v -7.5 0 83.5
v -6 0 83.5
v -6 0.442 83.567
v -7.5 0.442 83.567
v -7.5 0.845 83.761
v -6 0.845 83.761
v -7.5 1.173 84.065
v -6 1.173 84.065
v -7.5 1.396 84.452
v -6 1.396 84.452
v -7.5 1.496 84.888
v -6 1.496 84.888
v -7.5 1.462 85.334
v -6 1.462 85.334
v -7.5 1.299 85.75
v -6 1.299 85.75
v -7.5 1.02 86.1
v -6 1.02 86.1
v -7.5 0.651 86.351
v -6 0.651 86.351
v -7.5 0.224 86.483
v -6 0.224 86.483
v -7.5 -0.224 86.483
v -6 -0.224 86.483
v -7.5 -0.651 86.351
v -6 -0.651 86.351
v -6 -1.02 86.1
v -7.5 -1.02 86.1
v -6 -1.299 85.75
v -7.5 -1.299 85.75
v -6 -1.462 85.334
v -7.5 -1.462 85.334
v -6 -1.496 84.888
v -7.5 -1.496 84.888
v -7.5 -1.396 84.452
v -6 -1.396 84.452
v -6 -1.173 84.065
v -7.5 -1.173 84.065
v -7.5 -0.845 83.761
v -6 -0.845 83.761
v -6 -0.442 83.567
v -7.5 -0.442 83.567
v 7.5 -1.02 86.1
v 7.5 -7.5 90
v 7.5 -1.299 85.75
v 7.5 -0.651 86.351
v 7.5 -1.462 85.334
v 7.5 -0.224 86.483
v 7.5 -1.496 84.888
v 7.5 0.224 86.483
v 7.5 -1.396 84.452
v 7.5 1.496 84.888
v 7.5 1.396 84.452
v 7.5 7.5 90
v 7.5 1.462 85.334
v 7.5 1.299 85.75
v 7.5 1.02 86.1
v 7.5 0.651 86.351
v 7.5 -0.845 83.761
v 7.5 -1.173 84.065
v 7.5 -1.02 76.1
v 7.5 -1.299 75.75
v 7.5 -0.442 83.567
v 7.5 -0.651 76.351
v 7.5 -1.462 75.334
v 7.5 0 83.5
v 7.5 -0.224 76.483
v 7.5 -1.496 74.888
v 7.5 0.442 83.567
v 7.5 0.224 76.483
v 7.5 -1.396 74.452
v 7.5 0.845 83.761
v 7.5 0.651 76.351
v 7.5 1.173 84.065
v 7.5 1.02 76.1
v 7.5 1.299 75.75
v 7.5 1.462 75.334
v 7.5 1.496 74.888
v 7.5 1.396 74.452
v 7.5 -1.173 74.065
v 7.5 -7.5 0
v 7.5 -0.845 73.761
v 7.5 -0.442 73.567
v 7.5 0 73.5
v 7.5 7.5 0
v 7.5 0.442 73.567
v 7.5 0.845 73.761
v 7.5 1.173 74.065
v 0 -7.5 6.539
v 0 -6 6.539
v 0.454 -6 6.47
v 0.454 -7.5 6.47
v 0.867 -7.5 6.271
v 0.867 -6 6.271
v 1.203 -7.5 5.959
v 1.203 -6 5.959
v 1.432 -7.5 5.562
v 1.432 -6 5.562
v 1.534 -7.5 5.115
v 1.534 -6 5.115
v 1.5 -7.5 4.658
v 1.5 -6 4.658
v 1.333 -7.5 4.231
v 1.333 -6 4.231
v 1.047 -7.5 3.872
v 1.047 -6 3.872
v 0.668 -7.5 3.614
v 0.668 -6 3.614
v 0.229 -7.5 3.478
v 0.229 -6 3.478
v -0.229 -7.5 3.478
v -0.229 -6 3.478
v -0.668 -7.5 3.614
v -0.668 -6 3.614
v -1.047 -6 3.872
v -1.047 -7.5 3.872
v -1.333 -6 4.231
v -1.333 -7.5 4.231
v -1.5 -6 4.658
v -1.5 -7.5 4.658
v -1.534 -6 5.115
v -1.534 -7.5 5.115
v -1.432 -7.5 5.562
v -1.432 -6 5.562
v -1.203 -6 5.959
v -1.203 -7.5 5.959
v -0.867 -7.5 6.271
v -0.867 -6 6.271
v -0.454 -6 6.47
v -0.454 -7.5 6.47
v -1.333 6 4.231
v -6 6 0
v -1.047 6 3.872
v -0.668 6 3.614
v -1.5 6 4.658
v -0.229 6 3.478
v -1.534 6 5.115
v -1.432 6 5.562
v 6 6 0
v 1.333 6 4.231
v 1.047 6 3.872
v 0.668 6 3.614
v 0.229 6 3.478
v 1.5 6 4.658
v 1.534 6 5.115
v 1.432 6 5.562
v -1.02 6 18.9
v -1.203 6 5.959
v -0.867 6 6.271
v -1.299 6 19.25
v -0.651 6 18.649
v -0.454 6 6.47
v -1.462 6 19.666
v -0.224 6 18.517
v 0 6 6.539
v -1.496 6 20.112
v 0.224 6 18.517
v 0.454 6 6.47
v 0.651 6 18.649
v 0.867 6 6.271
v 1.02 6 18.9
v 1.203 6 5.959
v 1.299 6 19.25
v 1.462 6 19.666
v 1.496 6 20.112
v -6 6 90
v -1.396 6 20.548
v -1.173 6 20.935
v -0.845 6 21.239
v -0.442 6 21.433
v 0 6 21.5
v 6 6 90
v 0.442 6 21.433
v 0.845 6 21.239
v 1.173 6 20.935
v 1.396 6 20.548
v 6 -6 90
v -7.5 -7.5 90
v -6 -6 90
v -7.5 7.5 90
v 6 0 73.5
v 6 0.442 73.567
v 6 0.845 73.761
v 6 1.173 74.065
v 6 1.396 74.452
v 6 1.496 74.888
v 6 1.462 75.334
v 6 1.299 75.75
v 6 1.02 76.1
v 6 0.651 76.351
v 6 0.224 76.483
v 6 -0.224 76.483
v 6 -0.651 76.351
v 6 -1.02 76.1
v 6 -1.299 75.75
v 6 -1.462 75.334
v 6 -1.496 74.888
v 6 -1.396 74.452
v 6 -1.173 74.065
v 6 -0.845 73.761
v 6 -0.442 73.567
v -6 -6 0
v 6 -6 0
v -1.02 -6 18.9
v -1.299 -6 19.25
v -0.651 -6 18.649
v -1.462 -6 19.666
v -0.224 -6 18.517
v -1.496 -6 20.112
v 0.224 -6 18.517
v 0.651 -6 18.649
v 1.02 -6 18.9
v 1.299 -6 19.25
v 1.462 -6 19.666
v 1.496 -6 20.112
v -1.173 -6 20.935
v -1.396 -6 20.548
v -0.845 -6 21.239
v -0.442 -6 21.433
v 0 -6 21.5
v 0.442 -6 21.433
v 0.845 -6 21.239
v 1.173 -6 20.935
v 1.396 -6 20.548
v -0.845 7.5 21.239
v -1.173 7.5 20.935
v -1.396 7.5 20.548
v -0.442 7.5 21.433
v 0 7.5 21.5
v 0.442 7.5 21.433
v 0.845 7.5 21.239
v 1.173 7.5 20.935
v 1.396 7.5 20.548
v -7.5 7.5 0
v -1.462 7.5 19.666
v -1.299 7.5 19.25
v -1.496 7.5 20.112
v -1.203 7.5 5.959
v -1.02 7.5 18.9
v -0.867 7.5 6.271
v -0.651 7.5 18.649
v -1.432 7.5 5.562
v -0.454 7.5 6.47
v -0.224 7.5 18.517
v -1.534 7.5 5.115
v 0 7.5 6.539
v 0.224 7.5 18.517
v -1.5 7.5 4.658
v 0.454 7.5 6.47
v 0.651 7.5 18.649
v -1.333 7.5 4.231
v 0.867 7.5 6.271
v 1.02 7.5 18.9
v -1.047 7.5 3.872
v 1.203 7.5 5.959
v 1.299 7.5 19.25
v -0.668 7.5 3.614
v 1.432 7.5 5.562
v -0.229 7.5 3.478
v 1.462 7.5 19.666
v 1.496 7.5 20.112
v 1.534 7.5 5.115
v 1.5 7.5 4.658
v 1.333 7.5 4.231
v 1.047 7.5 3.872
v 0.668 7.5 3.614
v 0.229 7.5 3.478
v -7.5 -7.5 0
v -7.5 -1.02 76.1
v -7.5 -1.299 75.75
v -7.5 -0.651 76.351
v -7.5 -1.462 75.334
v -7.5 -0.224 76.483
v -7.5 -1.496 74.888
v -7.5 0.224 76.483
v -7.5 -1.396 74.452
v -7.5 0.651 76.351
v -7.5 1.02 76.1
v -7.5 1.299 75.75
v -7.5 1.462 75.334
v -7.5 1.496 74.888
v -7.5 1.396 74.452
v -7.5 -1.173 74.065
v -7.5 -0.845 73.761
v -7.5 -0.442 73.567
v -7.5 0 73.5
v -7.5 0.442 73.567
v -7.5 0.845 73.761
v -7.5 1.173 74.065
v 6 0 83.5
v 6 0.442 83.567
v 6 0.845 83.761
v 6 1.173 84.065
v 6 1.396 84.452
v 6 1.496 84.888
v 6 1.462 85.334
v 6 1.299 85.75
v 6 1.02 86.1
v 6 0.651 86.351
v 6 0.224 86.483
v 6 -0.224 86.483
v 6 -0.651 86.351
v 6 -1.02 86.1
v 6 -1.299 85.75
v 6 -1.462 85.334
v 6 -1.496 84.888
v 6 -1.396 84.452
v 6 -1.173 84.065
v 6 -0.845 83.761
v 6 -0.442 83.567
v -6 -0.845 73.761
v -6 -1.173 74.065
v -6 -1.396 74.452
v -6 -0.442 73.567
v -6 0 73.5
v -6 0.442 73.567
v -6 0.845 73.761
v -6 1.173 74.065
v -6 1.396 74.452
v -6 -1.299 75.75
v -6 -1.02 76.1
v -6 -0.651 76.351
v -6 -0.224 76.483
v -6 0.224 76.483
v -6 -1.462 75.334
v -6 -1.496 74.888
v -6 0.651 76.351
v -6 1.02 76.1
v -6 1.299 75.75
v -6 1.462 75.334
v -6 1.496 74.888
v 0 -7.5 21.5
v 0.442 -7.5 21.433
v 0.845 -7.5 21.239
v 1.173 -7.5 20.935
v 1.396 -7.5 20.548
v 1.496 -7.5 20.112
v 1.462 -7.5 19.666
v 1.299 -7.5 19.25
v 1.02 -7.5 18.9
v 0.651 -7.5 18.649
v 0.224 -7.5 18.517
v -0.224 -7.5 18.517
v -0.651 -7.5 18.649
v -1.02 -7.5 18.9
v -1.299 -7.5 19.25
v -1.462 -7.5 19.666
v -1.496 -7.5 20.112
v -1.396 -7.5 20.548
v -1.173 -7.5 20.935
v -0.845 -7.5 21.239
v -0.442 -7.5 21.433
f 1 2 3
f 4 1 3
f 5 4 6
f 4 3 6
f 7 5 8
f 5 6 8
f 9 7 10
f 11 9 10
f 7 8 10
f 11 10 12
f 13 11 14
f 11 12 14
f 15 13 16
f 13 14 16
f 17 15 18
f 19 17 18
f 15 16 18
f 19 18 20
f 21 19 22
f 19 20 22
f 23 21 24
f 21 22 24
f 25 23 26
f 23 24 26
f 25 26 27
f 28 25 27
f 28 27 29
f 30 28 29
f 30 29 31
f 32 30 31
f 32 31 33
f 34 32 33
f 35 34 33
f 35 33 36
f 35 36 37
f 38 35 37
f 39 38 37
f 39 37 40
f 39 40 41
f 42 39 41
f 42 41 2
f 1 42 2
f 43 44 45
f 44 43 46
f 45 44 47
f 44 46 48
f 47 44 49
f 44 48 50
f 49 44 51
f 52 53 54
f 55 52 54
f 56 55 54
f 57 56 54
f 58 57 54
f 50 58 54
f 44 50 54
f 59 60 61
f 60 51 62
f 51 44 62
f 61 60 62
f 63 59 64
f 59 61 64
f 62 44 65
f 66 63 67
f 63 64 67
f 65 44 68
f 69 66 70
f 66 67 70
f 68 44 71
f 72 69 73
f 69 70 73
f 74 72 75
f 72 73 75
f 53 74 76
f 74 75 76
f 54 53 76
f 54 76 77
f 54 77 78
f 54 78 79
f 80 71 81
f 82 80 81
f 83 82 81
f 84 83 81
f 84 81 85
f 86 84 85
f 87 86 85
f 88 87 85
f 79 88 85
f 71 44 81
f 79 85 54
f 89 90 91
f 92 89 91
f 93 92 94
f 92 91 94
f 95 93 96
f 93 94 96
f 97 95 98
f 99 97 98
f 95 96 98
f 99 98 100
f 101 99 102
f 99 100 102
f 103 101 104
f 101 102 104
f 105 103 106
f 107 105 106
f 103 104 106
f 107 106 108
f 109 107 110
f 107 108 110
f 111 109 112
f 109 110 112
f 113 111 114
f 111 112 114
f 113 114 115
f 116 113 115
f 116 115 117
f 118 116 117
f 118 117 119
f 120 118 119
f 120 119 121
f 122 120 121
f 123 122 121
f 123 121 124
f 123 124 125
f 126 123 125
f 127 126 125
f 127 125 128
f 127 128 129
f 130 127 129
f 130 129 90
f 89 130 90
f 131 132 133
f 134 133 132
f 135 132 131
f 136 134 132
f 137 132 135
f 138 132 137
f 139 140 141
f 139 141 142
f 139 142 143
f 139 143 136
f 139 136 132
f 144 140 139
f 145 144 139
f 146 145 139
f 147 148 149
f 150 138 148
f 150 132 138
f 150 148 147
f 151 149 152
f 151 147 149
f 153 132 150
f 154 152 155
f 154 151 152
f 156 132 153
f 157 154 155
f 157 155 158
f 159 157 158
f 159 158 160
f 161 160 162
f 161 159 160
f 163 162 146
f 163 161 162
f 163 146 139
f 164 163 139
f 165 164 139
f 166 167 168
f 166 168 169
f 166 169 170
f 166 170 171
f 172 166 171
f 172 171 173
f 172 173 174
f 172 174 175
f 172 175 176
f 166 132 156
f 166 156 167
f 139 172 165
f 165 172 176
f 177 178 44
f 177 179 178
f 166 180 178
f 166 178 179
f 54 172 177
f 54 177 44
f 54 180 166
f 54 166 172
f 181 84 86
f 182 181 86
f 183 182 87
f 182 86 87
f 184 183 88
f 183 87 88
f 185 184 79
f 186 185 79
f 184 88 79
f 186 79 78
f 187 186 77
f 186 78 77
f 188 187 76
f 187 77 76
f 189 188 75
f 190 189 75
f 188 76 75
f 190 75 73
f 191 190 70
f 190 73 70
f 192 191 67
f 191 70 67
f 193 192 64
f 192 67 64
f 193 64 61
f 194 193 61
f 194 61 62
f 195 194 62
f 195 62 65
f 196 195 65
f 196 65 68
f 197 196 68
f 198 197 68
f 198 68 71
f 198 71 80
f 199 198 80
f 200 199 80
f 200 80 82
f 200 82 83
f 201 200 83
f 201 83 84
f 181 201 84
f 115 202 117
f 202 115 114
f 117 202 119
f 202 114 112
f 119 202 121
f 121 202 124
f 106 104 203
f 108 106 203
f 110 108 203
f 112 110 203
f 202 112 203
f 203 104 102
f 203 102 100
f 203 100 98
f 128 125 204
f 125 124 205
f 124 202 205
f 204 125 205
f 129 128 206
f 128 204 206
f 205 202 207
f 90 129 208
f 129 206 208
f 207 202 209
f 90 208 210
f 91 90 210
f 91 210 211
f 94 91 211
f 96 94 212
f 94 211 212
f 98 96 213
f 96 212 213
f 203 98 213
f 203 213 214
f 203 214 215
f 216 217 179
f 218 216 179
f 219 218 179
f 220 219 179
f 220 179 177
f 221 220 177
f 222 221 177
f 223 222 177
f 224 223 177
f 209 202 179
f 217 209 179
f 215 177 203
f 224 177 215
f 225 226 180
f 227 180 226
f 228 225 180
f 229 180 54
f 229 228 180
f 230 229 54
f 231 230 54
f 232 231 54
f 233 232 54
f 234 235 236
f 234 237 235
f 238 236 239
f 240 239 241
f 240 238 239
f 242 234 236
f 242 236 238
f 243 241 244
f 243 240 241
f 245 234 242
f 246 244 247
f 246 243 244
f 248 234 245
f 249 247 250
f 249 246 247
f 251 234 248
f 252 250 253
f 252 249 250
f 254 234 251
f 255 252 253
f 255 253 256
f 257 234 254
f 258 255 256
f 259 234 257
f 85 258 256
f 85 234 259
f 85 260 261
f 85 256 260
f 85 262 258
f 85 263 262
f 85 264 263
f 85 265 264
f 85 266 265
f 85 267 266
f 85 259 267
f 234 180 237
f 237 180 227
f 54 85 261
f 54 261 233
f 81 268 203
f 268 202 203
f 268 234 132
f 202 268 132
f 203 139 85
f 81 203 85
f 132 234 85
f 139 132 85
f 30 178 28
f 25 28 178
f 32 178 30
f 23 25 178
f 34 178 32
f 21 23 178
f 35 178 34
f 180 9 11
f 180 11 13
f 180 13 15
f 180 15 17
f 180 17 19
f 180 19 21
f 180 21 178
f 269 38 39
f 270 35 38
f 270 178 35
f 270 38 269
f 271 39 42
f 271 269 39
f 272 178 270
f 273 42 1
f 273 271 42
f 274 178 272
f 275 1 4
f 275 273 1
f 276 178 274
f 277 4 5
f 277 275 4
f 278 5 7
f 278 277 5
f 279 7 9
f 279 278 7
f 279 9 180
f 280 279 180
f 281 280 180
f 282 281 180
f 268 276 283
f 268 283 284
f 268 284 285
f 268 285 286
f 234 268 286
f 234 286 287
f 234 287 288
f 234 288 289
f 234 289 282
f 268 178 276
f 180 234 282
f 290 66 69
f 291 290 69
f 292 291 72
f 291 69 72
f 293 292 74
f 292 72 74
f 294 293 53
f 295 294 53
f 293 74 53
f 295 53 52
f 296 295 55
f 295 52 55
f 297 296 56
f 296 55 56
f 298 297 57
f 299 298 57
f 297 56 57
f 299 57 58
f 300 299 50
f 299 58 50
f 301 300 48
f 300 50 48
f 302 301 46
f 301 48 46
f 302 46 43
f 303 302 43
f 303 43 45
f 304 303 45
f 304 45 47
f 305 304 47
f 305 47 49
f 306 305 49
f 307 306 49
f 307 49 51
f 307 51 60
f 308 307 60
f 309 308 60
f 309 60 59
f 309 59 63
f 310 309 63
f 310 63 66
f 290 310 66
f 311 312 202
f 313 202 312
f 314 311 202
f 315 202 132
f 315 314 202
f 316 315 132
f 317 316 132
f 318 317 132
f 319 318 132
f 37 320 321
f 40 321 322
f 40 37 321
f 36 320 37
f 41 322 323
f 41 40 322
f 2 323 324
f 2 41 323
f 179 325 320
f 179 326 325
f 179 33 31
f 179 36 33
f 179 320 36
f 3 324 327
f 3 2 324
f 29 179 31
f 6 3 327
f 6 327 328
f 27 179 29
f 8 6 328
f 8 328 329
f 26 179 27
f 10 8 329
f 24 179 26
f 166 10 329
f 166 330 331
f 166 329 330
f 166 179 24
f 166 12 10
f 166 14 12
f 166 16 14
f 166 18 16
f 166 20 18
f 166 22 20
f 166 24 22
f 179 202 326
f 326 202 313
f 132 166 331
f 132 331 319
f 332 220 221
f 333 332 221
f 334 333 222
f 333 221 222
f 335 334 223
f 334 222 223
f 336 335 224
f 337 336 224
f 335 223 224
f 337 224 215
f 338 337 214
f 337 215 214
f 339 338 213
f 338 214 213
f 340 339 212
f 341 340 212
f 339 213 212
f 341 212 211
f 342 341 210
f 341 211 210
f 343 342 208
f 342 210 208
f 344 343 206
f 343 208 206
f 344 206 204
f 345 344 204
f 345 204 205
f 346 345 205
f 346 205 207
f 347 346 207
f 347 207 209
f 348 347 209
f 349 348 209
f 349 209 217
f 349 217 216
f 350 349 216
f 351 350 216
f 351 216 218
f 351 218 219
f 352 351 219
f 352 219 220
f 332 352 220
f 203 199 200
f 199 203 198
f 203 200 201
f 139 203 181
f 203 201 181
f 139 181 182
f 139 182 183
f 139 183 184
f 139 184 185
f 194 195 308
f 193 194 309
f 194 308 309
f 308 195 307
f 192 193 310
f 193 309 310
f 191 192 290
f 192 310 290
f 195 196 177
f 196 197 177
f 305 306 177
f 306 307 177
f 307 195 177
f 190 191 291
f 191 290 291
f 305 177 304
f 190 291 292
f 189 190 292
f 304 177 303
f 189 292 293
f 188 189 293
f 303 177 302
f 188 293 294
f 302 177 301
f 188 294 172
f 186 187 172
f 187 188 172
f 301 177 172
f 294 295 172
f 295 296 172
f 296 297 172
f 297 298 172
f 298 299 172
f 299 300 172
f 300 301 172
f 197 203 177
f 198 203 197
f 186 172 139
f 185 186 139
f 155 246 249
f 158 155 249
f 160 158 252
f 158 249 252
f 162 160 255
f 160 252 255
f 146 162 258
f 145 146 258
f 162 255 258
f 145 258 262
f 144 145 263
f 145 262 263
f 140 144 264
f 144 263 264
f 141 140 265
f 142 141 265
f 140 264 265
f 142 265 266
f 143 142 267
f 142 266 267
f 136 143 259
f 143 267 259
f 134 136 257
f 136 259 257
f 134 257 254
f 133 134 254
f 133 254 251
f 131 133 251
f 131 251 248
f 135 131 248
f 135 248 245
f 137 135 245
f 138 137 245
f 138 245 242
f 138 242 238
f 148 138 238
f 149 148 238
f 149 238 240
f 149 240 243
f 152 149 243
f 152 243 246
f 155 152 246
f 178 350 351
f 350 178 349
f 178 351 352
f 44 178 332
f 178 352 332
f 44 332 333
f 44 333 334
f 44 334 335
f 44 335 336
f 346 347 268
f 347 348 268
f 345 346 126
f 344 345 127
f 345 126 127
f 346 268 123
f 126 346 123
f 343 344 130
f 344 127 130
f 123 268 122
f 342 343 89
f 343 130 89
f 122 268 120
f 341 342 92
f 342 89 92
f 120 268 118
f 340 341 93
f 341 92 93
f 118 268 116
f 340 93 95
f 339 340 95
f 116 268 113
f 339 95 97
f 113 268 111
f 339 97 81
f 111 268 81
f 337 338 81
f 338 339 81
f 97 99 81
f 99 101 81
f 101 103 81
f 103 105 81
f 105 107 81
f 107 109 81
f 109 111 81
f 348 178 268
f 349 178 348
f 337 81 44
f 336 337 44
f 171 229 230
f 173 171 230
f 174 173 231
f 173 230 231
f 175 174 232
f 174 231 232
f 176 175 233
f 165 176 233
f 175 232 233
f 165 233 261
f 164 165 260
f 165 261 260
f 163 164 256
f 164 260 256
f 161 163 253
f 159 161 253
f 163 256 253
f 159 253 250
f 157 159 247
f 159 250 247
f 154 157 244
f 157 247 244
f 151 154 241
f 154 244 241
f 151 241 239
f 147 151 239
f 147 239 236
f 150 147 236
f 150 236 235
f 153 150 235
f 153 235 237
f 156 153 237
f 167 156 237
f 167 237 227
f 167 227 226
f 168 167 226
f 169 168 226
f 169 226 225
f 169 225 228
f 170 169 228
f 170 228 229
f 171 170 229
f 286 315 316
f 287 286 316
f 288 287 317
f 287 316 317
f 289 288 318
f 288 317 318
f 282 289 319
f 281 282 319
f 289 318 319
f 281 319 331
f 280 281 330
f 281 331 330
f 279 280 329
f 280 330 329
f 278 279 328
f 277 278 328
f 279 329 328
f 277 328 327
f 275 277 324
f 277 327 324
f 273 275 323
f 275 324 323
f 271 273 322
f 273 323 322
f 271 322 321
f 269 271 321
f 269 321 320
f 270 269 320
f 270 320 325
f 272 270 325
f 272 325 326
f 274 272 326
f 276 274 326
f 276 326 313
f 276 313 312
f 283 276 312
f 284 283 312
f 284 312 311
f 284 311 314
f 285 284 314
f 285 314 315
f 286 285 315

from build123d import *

# Parameters (mm, degrees)
ESQUISSE1_W             = 15
ESQUISSE1_H             = 15
EXTRUSION1_DEPTH        = 90
ESQUISSE2_W             = 12
ESQUISSE2_H             = 12
EXTRUSION2_DEPTH        = 91.622844802
ESQUISSE3_R             = 1.5
ENL_V_MAT_EXTRU_1_DEPTH = 92.549167118
ESQUISSE4_R             = 1.5
ESQUISSE4_R_2           = 1.538778498
ENL_V_MAT_EXTRU_2_DEPTH = 92.549167118


with BuildPart() as part:
    # Esquisse1 → Extrusion1 (new body)
    with BuildSketch(Plane.XY):
        Rectangle(ESQUISSE1_W, ESQUISSE1_H)
    extrude(amount=EXTRUSION1_DEPTH)

    # Esquisse2 → Extrusion2 (cut, through all)
    with BuildSketch(Plane.XY.offset(90)):
        Rectangle(ESQUISSE2_W, ESQUISSE2_H)
    extrude(amount=-EXTRUSION2_DEPTH, mode=Mode.SUBTRACT)

    # Esquisse3 → Enlèv. mat.-Extru.1 (cut, through all)
    with BuildSketch(Plane(origin=(7.5, 0, 0), x_dir=(0, 0, -1), z_dir=(1, 0, 0))):
        with Locations((-85, 0)):
            Circle(ESQUISSE3_R)
        with Locations((-75, 0)):
            Circle(ESQUISSE3_R)
    extrude(amount=-ENL_V_MAT_EXTRU_1_DEPTH, mode=Mode.SUBTRACT)

    # Esquisse4 → Enlèv. mat.-Extru.2 (cut, through all)
    with BuildSketch(Plane(origin=(0, 7.5, 0), x_dir=(1, 0, 0), z_dir=(0, 1, 0))):
        with Locations(Location((0, -20, 0), (0, 0, 270))):
            Circle(ESQUISSE4_R)
        with Locations(Location((0, -5, 0), (0, 0, 270))):
            Circle(ESQUISSE4_R_2)
    extrude(amount=-ENL_V_MAT_EXTRU_2_DEPTH, mode=Mode.SUBTRACT)


solid = part.part
